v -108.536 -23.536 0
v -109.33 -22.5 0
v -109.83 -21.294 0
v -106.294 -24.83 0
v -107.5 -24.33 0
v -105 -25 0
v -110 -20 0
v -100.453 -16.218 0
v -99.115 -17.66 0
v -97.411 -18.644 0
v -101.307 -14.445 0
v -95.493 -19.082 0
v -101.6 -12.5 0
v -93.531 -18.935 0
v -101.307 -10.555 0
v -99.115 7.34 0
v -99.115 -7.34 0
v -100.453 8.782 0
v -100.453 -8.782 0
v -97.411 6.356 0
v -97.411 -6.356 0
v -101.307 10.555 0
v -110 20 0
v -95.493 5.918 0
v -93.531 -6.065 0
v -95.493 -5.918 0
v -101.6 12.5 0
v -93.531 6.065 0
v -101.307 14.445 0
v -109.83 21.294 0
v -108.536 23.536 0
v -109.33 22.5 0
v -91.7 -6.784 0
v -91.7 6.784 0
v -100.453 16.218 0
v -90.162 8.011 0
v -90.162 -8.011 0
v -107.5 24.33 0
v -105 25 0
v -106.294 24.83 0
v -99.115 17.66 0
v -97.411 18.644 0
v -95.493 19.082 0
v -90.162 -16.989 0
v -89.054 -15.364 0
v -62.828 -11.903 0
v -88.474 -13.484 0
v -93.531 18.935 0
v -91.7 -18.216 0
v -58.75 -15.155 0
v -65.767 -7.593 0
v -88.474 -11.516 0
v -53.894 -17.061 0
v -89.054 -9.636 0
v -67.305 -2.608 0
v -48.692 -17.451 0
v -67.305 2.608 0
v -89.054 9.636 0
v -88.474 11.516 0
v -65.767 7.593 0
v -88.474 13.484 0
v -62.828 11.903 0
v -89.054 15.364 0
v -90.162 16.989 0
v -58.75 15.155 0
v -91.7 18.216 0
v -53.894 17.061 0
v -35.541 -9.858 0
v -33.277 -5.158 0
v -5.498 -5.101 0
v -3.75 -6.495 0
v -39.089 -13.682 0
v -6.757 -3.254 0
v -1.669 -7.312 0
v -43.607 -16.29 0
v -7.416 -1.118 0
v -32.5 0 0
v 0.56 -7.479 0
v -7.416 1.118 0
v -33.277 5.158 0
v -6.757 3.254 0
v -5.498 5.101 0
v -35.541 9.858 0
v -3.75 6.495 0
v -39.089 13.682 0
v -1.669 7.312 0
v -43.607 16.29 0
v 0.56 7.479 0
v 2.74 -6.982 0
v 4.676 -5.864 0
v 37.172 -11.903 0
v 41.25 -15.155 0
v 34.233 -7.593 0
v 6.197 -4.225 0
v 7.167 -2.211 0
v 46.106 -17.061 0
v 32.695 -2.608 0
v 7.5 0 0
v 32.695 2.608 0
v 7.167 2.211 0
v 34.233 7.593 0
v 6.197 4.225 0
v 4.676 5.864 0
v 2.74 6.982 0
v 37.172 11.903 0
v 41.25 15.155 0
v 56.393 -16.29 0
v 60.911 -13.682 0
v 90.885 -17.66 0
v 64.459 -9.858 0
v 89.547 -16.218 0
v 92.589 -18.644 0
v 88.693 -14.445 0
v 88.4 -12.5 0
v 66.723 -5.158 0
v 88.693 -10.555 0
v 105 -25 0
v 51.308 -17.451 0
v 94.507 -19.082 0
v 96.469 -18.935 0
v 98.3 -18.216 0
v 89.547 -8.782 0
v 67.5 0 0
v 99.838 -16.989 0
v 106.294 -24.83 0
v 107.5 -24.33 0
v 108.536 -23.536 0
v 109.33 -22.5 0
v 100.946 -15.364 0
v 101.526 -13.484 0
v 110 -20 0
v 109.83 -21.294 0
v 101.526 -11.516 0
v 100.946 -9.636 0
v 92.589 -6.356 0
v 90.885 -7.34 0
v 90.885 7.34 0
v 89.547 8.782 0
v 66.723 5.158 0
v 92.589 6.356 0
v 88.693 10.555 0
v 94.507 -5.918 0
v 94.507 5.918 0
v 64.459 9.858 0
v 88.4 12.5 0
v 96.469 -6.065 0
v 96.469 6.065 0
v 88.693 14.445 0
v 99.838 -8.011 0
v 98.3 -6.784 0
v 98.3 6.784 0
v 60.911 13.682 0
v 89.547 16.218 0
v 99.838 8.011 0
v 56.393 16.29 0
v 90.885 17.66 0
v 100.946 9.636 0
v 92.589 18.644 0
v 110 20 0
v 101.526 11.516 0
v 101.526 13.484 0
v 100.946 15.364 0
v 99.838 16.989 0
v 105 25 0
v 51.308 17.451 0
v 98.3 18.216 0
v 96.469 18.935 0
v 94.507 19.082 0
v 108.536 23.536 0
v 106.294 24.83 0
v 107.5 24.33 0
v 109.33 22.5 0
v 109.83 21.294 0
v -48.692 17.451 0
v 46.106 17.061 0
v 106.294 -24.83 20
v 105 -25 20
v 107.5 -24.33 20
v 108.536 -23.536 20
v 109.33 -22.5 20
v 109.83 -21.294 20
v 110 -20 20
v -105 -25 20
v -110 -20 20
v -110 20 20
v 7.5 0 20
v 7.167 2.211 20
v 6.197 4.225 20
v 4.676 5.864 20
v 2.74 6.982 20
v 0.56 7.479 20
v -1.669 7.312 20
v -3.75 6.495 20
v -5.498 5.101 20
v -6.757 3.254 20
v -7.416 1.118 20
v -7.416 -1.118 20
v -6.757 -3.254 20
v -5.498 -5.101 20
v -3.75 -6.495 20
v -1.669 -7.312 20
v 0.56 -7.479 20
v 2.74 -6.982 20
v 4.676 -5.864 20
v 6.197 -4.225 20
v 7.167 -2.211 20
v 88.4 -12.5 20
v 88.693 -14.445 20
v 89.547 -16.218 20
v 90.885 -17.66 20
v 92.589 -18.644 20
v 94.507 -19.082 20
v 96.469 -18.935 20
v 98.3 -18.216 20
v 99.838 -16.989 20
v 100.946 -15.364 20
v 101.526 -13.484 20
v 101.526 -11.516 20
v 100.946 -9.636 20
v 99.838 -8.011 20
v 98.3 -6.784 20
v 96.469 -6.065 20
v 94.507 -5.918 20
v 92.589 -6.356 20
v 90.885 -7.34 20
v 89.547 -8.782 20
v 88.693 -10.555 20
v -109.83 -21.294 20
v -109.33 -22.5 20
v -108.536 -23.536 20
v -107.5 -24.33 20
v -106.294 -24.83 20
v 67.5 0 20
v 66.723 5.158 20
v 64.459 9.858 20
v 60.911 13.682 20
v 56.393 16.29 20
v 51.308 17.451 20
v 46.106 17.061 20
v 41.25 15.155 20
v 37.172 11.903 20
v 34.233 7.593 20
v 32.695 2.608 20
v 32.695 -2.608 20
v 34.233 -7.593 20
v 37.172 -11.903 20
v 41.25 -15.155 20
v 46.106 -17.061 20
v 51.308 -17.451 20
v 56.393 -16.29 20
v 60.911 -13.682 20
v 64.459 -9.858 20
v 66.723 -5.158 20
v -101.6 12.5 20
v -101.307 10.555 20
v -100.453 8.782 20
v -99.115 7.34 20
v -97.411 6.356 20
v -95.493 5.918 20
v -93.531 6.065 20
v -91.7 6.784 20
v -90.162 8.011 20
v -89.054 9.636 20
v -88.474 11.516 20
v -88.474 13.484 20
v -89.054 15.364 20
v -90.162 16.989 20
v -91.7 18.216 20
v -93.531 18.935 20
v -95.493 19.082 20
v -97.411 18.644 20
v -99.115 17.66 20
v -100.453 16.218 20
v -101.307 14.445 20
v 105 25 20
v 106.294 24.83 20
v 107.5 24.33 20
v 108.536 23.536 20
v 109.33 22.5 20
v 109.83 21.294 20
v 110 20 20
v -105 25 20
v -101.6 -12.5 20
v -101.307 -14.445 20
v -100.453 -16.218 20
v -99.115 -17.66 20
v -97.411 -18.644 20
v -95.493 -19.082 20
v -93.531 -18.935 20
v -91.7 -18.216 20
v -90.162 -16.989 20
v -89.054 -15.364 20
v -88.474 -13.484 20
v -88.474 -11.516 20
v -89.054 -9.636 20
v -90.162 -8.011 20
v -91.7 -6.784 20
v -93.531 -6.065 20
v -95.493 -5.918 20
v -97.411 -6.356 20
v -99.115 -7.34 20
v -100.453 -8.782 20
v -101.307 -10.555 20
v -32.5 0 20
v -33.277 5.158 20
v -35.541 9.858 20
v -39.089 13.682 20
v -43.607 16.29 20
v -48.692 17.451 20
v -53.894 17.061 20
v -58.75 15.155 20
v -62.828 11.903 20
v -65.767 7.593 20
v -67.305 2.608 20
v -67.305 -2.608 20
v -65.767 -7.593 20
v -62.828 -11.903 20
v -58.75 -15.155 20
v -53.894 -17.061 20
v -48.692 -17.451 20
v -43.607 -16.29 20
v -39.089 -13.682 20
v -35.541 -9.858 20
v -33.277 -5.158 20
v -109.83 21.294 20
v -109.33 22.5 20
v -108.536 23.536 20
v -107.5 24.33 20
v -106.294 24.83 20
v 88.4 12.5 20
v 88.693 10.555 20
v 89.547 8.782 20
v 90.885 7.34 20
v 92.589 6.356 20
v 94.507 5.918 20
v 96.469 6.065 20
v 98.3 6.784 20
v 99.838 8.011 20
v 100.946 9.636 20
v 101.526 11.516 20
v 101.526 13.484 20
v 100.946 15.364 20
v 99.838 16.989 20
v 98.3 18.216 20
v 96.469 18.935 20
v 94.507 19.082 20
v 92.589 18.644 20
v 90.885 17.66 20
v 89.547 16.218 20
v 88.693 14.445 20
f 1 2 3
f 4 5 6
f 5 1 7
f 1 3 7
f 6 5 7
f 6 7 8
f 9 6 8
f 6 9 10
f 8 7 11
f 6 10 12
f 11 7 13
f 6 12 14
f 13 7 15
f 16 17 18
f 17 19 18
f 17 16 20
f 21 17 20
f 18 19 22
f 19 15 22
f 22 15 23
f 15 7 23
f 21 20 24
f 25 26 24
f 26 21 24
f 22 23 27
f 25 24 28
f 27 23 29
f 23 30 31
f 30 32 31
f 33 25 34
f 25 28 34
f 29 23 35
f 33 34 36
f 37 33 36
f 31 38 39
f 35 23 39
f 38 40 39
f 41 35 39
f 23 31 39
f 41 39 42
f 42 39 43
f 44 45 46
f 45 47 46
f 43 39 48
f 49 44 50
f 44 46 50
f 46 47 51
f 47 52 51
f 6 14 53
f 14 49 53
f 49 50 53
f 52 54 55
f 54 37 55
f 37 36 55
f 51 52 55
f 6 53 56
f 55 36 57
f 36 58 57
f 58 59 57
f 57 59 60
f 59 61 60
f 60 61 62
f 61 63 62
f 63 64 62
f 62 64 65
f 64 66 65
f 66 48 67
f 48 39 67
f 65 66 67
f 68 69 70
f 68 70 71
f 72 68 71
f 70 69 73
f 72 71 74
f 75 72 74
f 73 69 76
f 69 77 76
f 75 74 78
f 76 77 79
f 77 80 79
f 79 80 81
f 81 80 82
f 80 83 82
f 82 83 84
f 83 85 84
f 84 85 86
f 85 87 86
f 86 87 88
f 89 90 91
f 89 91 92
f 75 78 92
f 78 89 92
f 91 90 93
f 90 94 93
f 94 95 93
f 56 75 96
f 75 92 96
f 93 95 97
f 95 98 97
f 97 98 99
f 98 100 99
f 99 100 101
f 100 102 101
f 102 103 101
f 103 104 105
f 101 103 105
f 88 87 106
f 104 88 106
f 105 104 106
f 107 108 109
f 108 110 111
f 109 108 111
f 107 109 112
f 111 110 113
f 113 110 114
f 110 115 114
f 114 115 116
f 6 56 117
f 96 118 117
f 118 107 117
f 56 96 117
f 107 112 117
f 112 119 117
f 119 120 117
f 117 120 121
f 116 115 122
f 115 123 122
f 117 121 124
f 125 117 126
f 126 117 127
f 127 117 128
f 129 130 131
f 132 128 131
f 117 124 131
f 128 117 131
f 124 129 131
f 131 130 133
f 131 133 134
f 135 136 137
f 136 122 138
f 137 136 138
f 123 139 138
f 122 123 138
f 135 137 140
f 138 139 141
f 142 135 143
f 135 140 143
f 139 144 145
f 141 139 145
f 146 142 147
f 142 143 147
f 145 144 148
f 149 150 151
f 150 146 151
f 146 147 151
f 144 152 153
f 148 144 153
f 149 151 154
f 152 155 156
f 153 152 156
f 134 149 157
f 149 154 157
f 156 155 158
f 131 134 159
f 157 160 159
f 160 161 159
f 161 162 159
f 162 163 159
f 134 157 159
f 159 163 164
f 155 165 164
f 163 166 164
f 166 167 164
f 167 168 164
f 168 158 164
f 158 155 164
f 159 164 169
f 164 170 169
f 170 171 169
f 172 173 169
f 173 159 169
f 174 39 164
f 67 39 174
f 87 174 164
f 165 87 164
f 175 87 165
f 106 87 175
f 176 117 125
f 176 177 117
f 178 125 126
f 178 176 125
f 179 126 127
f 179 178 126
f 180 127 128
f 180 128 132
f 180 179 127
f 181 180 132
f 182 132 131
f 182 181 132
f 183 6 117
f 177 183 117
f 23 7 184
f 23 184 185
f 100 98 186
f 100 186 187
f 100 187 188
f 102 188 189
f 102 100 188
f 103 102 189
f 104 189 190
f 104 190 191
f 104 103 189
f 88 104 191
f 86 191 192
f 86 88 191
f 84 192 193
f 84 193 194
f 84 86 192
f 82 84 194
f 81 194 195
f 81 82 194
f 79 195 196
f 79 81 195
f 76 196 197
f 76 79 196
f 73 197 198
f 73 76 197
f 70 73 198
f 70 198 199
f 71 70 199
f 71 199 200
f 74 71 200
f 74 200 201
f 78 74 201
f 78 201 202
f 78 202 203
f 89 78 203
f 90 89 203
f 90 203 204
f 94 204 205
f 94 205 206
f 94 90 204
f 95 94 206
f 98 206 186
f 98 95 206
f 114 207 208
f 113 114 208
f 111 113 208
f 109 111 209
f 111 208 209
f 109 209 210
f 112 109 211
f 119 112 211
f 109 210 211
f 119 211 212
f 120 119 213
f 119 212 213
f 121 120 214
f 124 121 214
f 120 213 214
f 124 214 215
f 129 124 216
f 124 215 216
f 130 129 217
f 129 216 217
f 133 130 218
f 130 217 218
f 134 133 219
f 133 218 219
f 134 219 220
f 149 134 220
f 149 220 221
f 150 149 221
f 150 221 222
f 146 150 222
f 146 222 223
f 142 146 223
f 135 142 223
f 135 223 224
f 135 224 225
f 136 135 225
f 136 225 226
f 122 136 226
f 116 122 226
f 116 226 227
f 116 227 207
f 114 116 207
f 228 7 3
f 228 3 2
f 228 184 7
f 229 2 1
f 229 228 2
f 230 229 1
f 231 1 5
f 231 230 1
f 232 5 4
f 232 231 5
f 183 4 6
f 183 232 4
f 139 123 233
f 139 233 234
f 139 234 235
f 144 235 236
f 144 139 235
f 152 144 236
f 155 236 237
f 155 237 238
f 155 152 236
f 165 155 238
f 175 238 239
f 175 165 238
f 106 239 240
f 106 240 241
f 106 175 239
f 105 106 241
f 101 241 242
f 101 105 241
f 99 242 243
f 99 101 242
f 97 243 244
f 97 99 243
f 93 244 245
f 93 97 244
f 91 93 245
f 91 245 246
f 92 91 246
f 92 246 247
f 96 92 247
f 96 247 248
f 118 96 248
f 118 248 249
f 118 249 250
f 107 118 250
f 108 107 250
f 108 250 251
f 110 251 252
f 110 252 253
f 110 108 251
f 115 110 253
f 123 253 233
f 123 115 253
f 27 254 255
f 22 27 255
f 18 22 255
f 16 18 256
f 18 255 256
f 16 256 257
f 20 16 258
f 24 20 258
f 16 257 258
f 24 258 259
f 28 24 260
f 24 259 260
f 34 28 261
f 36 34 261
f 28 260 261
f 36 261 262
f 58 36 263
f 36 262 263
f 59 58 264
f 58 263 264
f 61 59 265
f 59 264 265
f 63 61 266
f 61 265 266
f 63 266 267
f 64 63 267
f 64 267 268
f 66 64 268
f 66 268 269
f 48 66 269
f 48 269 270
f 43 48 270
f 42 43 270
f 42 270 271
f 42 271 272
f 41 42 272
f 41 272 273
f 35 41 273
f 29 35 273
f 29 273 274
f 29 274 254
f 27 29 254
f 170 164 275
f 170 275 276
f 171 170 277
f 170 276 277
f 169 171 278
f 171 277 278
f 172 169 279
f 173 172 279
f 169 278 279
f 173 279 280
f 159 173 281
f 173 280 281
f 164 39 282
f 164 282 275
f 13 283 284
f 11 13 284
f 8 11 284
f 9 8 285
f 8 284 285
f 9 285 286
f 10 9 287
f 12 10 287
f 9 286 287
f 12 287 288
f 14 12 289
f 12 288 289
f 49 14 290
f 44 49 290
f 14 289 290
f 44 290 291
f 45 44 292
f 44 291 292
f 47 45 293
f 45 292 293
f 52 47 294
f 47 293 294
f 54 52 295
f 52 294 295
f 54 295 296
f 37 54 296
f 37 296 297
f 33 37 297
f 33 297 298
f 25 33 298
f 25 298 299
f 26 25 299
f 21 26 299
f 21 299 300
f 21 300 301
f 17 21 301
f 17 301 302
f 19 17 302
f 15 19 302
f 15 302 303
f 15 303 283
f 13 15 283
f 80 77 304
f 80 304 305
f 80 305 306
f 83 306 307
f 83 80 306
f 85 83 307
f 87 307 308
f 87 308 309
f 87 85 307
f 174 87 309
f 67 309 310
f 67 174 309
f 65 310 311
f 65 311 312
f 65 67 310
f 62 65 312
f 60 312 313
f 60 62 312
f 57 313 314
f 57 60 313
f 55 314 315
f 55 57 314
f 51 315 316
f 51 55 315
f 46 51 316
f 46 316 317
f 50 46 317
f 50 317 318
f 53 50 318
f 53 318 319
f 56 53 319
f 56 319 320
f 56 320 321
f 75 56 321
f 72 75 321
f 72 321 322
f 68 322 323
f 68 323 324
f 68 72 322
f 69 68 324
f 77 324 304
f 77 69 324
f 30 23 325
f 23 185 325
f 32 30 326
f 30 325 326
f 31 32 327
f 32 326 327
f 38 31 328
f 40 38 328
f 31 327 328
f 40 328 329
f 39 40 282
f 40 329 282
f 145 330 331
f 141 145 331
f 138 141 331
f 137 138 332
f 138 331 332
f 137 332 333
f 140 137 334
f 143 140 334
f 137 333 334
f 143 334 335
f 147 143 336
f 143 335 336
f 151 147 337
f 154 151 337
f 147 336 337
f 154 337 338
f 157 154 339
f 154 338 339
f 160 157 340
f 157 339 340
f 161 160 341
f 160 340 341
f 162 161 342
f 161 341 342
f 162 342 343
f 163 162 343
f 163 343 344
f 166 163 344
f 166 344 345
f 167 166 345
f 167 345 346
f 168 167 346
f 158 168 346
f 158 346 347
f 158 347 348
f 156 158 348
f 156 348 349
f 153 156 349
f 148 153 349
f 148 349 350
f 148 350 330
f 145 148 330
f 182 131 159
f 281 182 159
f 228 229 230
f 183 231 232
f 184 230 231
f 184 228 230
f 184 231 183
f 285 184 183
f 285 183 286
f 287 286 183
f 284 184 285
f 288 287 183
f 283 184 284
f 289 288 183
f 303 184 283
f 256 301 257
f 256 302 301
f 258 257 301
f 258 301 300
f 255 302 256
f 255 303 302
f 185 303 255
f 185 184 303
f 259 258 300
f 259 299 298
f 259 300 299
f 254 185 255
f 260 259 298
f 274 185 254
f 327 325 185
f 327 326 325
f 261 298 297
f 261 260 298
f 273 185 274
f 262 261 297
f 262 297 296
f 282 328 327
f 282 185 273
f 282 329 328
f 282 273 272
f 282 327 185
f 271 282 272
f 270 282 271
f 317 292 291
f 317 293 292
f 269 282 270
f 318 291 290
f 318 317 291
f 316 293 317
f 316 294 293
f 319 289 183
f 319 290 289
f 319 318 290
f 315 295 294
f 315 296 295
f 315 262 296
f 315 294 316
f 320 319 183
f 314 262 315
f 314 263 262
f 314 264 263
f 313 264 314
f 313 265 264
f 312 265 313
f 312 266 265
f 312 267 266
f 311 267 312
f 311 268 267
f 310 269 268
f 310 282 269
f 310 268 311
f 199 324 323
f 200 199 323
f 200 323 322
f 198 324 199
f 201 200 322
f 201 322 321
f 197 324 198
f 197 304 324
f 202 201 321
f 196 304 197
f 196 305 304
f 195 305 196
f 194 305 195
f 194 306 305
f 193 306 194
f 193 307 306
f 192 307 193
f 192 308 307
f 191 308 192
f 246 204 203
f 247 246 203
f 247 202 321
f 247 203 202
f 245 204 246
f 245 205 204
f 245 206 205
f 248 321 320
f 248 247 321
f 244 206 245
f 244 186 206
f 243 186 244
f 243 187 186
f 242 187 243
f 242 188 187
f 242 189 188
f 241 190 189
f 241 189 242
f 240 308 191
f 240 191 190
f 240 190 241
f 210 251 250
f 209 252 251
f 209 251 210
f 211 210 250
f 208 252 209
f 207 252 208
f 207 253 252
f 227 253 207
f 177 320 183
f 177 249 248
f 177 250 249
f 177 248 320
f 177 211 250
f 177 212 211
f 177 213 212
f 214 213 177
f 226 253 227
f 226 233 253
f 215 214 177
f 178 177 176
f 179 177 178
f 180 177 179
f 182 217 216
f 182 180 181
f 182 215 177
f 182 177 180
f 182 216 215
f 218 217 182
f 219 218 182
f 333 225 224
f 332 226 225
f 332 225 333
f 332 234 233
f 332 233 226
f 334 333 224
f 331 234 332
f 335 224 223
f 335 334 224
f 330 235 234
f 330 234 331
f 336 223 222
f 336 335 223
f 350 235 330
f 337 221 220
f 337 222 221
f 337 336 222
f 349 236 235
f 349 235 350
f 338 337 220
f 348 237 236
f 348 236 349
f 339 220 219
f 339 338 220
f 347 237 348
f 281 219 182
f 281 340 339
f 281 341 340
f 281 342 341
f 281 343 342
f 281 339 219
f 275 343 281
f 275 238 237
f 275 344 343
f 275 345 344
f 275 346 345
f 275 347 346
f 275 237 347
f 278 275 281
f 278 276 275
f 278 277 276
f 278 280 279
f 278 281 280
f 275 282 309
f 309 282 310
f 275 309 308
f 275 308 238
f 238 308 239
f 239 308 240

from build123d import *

# Parameters (mm, degrees)
F0_W     = 220
F0_H     = 50
F0_R     = 17.5
F0_R_2   = 7.5
F1_DEPTH = 20
F2_D     = 13.2
F3_R     = 5


with BuildPart() as f1:
    # F0 (on Top) → F1 (new body)
    with BuildSketch(Plane.XY):
        Rectangle(F0_W, F0_H)
        with Locations((-50, 0)):
            Circle(F0_R, mode=Mode.SUBTRACT)
        Circle(F0_R_2, mode=Mode.SUBTRACT)
        with Locations((50, 0)):
            Circle(F0_R, mode=Mode.SUBTRACT)
    extrude(amount=F1_DEPTH)

    # F2 (through all)
    with Locations(Plane(origin=(0, 0, 0), x_dir=(1, 0, 0), z_dir=(0, 0, -1))):
        with Locations((-95, -12.5), (-95, 12.5), (95, -12.5), (95, 12.5)):
            Hole(F2_D / 2)

    # F3
    f3_edges = [f1.edges().sort_by_distance(p)[0] for p in [
        (-110, -25, 10),
        (110, -25, 10),
        (110, 25, 10),
        (-110, 25, 10),
    ]]
    fillet(f3_edges, radius=F3_R)


solid = f1.part
